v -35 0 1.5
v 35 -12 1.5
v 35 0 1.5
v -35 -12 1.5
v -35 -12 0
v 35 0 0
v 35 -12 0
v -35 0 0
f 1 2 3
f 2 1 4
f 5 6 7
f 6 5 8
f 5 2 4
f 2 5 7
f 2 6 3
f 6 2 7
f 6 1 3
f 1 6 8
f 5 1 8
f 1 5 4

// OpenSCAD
// Built by bench/smallmodels/features/compiler.py from a list of features.
$fn = 64;
union() {
    translate([0, -6, 0]) translate([-35, -6, 0]) cube([70, 12, 1.5]);
  }
